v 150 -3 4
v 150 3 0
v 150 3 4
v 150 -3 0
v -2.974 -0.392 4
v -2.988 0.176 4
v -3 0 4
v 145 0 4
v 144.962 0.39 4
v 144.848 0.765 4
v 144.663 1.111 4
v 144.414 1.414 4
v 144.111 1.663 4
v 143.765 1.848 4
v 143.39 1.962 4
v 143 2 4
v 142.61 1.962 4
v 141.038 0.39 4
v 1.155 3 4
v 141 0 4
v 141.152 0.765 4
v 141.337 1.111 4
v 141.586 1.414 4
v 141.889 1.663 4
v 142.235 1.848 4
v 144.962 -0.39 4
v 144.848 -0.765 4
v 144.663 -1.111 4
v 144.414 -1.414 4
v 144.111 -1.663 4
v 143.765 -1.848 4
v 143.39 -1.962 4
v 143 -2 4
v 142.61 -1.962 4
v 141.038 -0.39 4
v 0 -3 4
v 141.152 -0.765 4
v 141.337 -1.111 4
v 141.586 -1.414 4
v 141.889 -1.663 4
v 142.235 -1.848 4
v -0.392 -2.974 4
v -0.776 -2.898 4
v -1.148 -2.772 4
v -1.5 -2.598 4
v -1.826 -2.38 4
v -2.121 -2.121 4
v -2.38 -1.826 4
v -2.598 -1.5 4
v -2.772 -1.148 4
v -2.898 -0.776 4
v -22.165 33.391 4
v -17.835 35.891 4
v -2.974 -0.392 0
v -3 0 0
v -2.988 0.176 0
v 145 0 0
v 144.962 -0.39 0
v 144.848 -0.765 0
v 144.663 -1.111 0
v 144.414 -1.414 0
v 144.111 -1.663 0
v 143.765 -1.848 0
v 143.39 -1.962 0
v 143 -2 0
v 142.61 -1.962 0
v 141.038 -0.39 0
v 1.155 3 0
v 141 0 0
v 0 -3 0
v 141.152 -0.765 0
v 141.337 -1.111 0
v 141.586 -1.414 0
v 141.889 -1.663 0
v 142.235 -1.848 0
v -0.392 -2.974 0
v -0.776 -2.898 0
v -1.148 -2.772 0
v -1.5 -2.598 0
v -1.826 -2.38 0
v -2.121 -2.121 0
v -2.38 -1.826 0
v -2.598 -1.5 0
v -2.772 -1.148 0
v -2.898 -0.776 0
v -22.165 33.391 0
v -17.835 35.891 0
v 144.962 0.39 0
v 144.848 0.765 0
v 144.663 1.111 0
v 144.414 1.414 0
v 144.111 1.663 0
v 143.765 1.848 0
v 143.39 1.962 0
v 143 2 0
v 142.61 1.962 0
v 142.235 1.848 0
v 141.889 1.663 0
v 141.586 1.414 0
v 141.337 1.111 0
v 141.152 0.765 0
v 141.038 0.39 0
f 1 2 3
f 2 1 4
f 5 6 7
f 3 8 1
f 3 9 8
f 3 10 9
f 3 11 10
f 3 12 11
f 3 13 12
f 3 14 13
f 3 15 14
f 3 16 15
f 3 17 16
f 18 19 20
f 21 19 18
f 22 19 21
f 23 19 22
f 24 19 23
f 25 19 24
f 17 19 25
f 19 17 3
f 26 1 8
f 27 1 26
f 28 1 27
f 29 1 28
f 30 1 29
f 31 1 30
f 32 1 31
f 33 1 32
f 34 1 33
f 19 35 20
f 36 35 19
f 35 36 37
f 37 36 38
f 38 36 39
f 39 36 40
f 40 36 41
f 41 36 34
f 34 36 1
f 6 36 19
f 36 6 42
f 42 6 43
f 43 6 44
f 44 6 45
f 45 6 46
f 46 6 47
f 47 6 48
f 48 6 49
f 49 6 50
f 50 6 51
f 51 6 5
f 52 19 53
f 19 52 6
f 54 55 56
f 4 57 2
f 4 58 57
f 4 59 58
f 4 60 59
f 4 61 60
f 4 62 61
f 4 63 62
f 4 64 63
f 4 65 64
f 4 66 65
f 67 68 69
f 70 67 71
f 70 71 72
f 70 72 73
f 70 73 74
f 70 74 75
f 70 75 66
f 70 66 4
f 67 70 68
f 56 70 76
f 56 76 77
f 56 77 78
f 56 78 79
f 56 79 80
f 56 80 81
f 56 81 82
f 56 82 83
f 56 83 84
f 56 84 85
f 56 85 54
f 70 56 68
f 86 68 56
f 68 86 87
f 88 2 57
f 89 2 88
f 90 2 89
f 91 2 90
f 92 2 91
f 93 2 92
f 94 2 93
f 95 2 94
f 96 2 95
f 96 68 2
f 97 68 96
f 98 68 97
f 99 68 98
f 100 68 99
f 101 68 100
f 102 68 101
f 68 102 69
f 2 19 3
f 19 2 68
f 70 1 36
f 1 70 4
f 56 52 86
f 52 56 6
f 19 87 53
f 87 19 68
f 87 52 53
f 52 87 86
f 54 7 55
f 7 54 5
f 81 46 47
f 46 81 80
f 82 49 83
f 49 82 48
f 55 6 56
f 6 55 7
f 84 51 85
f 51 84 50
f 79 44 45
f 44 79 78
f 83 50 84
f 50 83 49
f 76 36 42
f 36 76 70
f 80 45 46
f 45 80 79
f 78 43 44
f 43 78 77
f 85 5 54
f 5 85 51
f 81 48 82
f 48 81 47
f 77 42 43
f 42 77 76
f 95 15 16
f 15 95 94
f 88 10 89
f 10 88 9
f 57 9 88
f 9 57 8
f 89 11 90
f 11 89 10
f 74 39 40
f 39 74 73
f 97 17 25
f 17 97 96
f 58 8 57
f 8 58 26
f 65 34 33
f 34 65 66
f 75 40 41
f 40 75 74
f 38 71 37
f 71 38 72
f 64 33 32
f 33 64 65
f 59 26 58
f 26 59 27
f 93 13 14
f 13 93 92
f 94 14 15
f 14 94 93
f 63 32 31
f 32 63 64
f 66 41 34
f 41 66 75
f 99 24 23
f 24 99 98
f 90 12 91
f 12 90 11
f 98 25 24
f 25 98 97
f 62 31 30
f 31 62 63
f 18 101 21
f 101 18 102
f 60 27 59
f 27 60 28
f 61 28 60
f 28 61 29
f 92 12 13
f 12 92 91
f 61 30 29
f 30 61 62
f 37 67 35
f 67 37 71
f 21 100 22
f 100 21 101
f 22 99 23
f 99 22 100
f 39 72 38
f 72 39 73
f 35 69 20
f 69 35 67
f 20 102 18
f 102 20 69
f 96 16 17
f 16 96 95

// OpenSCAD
// KNOWN-WRONG PART (must fail): the foot is 4 mm thick (as thick as the handle) instead of 2.5
// L-shaped ("hockey-stick") cell spreader for plating bacteria
// Category: tools. A flat handle and a thinner spreading foot at 120 degrees, joined by a round
// boss; the foot's bed side is the smooth spreading face. Hanging hole at the handle end.
// Print: PETG or PP, lying flat, 0.15 mm layers, 100 % infill; sterilise with 70 % ethanol
// (or autoclave only if printed in PP).
// SPDX-License-Identifier: CERN-OHL-P-2.0

/* [Spreader] */
handle = [150, 6, 4];     // length (X), width (Y), thickness (Z)
foot = [40, 5, 4];        // length along its centre line, width, thickness
foot_angle = 120;         // counter-clockwise from +X, seen from above
boss_d = 6;               // joins the bars at the origin, full handle thickness
hole_d = 4;
hole_x = 143;

/* [Hidden] */
eps = 0.01;

difference() {
    union() {
        translate([0, -handle.y / 2, 0]) cube(handle);
        rotate([0, 0, foot_angle]) translate([0, -foot.y / 2, 0]) cube(foot);
        cylinder(d = boss_d, h = handle.z, $fn = 48);
    }
    translate([hole_x, 0, -1]) cylinder(d = hole_d, h = handle.z + 2, $fn = 32);
}
